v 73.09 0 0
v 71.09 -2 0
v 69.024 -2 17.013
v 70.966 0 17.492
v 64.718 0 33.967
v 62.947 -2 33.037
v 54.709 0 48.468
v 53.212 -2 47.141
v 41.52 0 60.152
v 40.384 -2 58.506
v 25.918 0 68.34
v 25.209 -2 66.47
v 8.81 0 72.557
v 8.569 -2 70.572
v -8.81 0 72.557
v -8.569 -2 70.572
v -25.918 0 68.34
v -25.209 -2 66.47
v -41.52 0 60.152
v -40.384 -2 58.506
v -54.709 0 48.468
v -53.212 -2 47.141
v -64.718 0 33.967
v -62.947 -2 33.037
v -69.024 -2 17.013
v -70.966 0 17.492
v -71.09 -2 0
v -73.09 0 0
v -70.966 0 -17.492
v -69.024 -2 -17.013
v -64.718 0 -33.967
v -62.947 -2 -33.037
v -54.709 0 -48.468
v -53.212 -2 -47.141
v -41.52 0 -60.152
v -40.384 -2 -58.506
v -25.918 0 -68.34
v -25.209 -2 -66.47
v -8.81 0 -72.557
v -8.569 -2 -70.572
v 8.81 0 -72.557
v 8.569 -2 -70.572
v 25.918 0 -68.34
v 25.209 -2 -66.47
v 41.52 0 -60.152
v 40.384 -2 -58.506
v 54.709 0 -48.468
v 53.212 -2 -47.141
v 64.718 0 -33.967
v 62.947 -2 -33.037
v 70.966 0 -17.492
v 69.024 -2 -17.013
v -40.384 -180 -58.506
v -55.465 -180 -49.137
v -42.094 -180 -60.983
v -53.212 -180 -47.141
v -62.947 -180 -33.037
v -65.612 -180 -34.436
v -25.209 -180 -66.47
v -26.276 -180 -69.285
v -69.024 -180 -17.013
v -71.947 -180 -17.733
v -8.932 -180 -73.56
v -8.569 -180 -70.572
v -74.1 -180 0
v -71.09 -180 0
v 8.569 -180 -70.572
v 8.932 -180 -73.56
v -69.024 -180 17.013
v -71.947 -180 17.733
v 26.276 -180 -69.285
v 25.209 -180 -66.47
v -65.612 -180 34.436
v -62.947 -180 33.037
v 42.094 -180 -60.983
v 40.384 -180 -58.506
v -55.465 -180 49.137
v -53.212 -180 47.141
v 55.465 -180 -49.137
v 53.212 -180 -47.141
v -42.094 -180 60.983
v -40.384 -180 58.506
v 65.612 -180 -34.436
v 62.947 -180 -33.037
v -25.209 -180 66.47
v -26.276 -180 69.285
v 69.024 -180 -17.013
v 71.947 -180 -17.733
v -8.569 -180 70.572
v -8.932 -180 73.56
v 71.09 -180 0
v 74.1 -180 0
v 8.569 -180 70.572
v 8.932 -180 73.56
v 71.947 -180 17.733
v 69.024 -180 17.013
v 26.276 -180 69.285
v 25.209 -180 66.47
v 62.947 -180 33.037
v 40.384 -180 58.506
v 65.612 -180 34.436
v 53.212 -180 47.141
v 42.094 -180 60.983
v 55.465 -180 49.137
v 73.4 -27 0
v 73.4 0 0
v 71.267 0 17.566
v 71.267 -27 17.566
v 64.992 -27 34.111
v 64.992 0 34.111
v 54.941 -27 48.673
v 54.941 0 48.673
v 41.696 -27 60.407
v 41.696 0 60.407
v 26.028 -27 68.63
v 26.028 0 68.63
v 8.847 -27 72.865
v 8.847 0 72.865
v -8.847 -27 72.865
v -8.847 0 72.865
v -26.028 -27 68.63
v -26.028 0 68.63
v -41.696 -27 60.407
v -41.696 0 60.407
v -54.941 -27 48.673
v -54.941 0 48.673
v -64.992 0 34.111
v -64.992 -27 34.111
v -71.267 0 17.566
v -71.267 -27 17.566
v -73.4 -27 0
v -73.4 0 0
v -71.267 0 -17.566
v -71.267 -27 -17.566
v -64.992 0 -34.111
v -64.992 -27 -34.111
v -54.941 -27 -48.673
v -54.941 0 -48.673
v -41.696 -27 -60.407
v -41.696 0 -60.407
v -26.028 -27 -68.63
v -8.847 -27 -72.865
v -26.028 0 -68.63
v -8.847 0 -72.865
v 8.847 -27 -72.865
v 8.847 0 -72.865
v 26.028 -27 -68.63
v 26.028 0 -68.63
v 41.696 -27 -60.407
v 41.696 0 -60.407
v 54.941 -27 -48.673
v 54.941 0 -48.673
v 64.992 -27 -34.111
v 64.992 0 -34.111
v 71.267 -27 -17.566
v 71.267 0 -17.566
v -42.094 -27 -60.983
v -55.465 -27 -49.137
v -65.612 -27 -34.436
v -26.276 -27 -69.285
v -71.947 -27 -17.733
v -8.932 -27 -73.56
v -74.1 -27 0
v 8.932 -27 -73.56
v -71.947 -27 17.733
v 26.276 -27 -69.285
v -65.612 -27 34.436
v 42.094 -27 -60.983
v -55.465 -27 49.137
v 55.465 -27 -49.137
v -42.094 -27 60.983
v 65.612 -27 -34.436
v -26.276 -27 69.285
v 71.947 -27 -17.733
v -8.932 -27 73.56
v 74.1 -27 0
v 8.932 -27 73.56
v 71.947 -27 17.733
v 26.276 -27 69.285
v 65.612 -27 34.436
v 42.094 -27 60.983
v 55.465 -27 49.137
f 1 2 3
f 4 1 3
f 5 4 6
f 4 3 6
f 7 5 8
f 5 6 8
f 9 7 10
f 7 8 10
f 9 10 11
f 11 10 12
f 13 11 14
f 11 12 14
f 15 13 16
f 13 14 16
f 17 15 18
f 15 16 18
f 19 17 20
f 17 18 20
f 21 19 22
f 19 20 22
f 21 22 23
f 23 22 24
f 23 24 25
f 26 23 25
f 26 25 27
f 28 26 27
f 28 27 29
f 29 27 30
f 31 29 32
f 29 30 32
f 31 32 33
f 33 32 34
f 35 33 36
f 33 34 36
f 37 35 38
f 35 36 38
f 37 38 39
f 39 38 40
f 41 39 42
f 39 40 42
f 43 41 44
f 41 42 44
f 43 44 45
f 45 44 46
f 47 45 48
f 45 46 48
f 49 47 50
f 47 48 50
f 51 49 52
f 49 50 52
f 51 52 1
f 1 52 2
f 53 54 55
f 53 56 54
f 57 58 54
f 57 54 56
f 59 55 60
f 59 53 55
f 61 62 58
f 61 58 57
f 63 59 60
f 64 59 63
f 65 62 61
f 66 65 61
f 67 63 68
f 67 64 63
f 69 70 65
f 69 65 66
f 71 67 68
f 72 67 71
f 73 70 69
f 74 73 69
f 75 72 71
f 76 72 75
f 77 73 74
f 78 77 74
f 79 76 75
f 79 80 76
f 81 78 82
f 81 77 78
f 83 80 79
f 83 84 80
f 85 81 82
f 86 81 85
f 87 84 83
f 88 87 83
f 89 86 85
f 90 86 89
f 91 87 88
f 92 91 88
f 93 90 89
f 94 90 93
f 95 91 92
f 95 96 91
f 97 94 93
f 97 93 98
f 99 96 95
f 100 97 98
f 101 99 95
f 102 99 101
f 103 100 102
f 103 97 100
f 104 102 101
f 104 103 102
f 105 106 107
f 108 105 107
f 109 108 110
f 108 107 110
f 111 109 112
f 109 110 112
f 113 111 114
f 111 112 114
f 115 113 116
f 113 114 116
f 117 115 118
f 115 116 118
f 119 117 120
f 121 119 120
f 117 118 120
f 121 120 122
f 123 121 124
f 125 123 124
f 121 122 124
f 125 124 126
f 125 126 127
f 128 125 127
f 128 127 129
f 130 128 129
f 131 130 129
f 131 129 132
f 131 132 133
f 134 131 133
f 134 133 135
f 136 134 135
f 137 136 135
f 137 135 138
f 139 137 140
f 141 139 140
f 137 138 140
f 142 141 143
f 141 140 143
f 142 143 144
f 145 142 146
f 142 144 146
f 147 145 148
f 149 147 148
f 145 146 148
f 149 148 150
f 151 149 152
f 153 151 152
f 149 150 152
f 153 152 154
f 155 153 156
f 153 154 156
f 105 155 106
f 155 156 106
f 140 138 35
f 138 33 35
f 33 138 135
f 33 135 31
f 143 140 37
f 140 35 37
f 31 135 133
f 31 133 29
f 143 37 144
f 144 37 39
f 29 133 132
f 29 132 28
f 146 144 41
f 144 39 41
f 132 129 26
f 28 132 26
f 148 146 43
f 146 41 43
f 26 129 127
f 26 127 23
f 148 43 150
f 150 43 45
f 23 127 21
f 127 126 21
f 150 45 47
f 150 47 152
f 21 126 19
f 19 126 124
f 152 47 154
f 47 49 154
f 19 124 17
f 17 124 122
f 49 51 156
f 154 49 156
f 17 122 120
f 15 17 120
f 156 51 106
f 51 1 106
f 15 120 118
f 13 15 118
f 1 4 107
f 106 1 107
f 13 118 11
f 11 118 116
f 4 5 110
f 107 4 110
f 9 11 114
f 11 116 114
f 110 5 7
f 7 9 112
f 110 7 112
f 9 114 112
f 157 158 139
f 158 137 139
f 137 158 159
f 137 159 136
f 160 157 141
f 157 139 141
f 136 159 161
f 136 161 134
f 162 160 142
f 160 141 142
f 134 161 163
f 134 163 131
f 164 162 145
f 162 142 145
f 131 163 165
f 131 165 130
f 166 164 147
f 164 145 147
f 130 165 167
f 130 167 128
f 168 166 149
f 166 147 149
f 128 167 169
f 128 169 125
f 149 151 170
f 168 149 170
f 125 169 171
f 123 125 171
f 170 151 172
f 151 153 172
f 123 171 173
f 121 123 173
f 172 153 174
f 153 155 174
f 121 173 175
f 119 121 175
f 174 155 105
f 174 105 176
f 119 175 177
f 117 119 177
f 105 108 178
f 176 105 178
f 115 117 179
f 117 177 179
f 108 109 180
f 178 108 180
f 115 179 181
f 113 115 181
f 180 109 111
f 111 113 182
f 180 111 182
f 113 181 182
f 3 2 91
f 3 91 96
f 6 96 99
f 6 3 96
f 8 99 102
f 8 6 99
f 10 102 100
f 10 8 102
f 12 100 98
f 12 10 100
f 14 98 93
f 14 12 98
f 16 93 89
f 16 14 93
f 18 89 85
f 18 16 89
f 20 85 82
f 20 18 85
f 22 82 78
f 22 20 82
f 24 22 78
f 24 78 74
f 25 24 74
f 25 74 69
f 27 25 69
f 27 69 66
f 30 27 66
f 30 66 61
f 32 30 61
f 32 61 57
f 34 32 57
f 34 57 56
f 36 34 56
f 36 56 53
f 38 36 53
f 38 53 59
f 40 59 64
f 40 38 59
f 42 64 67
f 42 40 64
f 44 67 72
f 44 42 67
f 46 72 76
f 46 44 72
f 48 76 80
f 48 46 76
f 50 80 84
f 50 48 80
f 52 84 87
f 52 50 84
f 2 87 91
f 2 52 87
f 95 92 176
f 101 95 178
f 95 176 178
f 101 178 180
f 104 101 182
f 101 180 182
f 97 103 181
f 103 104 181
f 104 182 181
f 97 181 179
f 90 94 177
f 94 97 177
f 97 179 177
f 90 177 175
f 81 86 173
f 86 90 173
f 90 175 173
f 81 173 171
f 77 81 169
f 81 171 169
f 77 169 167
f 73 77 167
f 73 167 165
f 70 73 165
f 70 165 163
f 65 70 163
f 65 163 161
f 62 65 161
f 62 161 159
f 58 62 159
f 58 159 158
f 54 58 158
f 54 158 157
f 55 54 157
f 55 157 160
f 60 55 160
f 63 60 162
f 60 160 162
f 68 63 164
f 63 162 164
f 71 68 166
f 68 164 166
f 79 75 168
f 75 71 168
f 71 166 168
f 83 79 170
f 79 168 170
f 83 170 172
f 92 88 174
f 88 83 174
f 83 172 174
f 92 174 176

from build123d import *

# Parameters (mm, degrees)
F0_R     = 74.1
F0_R_2   = 71.09
F1_DEPTH = 260
F2_R     = 78.65
F2_R_2   = 73.4
F3_DEPTH = 27
F4_R     = 74.1
F4_R_2   = 73.4
F5_DEPTH = 27
F6_SIZE  = 2
F7_R     = 95.050876
F7_R_2   = 7.411158
F8_DEPTH = 80


with BuildPart() as f1:
    # F0 (on Front) → F1 (new body)
    with BuildSketch(Plane.XZ):
        Circle(F0_R)
        Circle(F0_R_2, mode=Mode.SUBTRACT)
    extrude(amount=F1_DEPTH)

    # F2 (on Front) → F3 (cut)
    with BuildSketch(Plane.XZ):
        Circle(F2_R)
        Circle(F2_R_2, mode=Mode.SUBTRACT)
    extrude(amount=F3_DEPTH, mode=Mode.SUBTRACT)

    # F4 (on face) → F5 (cut)
    with BuildSketch(Plane.XZ.offset(260)):
        Circle(F4_R)
        Circle(F4_R_2, mode=Mode.SUBTRACT)
    extrude(amount=-F5_DEPTH, mode=Mode.SUBTRACT)

    # F6
    f6_edges = [f1.edges().sort_by_distance(p)[0] for p in [
        (-71.09, -260, 0),
        (-71.09, 0, 0),
    ]]
    chamfer(f6_edges, length=F6_SIZE)

    # F7 (on face) → F8 (cut)
    with BuildSketch(Plane.XZ.offset(260)):
        Circle(F7_R)
        Circle(F7_R_2, mode=Mode.SUBTRACT)
    extrude(amount=-F8_DEPTH, mode=Mode.SUBTRACT)


solid = f1.part
